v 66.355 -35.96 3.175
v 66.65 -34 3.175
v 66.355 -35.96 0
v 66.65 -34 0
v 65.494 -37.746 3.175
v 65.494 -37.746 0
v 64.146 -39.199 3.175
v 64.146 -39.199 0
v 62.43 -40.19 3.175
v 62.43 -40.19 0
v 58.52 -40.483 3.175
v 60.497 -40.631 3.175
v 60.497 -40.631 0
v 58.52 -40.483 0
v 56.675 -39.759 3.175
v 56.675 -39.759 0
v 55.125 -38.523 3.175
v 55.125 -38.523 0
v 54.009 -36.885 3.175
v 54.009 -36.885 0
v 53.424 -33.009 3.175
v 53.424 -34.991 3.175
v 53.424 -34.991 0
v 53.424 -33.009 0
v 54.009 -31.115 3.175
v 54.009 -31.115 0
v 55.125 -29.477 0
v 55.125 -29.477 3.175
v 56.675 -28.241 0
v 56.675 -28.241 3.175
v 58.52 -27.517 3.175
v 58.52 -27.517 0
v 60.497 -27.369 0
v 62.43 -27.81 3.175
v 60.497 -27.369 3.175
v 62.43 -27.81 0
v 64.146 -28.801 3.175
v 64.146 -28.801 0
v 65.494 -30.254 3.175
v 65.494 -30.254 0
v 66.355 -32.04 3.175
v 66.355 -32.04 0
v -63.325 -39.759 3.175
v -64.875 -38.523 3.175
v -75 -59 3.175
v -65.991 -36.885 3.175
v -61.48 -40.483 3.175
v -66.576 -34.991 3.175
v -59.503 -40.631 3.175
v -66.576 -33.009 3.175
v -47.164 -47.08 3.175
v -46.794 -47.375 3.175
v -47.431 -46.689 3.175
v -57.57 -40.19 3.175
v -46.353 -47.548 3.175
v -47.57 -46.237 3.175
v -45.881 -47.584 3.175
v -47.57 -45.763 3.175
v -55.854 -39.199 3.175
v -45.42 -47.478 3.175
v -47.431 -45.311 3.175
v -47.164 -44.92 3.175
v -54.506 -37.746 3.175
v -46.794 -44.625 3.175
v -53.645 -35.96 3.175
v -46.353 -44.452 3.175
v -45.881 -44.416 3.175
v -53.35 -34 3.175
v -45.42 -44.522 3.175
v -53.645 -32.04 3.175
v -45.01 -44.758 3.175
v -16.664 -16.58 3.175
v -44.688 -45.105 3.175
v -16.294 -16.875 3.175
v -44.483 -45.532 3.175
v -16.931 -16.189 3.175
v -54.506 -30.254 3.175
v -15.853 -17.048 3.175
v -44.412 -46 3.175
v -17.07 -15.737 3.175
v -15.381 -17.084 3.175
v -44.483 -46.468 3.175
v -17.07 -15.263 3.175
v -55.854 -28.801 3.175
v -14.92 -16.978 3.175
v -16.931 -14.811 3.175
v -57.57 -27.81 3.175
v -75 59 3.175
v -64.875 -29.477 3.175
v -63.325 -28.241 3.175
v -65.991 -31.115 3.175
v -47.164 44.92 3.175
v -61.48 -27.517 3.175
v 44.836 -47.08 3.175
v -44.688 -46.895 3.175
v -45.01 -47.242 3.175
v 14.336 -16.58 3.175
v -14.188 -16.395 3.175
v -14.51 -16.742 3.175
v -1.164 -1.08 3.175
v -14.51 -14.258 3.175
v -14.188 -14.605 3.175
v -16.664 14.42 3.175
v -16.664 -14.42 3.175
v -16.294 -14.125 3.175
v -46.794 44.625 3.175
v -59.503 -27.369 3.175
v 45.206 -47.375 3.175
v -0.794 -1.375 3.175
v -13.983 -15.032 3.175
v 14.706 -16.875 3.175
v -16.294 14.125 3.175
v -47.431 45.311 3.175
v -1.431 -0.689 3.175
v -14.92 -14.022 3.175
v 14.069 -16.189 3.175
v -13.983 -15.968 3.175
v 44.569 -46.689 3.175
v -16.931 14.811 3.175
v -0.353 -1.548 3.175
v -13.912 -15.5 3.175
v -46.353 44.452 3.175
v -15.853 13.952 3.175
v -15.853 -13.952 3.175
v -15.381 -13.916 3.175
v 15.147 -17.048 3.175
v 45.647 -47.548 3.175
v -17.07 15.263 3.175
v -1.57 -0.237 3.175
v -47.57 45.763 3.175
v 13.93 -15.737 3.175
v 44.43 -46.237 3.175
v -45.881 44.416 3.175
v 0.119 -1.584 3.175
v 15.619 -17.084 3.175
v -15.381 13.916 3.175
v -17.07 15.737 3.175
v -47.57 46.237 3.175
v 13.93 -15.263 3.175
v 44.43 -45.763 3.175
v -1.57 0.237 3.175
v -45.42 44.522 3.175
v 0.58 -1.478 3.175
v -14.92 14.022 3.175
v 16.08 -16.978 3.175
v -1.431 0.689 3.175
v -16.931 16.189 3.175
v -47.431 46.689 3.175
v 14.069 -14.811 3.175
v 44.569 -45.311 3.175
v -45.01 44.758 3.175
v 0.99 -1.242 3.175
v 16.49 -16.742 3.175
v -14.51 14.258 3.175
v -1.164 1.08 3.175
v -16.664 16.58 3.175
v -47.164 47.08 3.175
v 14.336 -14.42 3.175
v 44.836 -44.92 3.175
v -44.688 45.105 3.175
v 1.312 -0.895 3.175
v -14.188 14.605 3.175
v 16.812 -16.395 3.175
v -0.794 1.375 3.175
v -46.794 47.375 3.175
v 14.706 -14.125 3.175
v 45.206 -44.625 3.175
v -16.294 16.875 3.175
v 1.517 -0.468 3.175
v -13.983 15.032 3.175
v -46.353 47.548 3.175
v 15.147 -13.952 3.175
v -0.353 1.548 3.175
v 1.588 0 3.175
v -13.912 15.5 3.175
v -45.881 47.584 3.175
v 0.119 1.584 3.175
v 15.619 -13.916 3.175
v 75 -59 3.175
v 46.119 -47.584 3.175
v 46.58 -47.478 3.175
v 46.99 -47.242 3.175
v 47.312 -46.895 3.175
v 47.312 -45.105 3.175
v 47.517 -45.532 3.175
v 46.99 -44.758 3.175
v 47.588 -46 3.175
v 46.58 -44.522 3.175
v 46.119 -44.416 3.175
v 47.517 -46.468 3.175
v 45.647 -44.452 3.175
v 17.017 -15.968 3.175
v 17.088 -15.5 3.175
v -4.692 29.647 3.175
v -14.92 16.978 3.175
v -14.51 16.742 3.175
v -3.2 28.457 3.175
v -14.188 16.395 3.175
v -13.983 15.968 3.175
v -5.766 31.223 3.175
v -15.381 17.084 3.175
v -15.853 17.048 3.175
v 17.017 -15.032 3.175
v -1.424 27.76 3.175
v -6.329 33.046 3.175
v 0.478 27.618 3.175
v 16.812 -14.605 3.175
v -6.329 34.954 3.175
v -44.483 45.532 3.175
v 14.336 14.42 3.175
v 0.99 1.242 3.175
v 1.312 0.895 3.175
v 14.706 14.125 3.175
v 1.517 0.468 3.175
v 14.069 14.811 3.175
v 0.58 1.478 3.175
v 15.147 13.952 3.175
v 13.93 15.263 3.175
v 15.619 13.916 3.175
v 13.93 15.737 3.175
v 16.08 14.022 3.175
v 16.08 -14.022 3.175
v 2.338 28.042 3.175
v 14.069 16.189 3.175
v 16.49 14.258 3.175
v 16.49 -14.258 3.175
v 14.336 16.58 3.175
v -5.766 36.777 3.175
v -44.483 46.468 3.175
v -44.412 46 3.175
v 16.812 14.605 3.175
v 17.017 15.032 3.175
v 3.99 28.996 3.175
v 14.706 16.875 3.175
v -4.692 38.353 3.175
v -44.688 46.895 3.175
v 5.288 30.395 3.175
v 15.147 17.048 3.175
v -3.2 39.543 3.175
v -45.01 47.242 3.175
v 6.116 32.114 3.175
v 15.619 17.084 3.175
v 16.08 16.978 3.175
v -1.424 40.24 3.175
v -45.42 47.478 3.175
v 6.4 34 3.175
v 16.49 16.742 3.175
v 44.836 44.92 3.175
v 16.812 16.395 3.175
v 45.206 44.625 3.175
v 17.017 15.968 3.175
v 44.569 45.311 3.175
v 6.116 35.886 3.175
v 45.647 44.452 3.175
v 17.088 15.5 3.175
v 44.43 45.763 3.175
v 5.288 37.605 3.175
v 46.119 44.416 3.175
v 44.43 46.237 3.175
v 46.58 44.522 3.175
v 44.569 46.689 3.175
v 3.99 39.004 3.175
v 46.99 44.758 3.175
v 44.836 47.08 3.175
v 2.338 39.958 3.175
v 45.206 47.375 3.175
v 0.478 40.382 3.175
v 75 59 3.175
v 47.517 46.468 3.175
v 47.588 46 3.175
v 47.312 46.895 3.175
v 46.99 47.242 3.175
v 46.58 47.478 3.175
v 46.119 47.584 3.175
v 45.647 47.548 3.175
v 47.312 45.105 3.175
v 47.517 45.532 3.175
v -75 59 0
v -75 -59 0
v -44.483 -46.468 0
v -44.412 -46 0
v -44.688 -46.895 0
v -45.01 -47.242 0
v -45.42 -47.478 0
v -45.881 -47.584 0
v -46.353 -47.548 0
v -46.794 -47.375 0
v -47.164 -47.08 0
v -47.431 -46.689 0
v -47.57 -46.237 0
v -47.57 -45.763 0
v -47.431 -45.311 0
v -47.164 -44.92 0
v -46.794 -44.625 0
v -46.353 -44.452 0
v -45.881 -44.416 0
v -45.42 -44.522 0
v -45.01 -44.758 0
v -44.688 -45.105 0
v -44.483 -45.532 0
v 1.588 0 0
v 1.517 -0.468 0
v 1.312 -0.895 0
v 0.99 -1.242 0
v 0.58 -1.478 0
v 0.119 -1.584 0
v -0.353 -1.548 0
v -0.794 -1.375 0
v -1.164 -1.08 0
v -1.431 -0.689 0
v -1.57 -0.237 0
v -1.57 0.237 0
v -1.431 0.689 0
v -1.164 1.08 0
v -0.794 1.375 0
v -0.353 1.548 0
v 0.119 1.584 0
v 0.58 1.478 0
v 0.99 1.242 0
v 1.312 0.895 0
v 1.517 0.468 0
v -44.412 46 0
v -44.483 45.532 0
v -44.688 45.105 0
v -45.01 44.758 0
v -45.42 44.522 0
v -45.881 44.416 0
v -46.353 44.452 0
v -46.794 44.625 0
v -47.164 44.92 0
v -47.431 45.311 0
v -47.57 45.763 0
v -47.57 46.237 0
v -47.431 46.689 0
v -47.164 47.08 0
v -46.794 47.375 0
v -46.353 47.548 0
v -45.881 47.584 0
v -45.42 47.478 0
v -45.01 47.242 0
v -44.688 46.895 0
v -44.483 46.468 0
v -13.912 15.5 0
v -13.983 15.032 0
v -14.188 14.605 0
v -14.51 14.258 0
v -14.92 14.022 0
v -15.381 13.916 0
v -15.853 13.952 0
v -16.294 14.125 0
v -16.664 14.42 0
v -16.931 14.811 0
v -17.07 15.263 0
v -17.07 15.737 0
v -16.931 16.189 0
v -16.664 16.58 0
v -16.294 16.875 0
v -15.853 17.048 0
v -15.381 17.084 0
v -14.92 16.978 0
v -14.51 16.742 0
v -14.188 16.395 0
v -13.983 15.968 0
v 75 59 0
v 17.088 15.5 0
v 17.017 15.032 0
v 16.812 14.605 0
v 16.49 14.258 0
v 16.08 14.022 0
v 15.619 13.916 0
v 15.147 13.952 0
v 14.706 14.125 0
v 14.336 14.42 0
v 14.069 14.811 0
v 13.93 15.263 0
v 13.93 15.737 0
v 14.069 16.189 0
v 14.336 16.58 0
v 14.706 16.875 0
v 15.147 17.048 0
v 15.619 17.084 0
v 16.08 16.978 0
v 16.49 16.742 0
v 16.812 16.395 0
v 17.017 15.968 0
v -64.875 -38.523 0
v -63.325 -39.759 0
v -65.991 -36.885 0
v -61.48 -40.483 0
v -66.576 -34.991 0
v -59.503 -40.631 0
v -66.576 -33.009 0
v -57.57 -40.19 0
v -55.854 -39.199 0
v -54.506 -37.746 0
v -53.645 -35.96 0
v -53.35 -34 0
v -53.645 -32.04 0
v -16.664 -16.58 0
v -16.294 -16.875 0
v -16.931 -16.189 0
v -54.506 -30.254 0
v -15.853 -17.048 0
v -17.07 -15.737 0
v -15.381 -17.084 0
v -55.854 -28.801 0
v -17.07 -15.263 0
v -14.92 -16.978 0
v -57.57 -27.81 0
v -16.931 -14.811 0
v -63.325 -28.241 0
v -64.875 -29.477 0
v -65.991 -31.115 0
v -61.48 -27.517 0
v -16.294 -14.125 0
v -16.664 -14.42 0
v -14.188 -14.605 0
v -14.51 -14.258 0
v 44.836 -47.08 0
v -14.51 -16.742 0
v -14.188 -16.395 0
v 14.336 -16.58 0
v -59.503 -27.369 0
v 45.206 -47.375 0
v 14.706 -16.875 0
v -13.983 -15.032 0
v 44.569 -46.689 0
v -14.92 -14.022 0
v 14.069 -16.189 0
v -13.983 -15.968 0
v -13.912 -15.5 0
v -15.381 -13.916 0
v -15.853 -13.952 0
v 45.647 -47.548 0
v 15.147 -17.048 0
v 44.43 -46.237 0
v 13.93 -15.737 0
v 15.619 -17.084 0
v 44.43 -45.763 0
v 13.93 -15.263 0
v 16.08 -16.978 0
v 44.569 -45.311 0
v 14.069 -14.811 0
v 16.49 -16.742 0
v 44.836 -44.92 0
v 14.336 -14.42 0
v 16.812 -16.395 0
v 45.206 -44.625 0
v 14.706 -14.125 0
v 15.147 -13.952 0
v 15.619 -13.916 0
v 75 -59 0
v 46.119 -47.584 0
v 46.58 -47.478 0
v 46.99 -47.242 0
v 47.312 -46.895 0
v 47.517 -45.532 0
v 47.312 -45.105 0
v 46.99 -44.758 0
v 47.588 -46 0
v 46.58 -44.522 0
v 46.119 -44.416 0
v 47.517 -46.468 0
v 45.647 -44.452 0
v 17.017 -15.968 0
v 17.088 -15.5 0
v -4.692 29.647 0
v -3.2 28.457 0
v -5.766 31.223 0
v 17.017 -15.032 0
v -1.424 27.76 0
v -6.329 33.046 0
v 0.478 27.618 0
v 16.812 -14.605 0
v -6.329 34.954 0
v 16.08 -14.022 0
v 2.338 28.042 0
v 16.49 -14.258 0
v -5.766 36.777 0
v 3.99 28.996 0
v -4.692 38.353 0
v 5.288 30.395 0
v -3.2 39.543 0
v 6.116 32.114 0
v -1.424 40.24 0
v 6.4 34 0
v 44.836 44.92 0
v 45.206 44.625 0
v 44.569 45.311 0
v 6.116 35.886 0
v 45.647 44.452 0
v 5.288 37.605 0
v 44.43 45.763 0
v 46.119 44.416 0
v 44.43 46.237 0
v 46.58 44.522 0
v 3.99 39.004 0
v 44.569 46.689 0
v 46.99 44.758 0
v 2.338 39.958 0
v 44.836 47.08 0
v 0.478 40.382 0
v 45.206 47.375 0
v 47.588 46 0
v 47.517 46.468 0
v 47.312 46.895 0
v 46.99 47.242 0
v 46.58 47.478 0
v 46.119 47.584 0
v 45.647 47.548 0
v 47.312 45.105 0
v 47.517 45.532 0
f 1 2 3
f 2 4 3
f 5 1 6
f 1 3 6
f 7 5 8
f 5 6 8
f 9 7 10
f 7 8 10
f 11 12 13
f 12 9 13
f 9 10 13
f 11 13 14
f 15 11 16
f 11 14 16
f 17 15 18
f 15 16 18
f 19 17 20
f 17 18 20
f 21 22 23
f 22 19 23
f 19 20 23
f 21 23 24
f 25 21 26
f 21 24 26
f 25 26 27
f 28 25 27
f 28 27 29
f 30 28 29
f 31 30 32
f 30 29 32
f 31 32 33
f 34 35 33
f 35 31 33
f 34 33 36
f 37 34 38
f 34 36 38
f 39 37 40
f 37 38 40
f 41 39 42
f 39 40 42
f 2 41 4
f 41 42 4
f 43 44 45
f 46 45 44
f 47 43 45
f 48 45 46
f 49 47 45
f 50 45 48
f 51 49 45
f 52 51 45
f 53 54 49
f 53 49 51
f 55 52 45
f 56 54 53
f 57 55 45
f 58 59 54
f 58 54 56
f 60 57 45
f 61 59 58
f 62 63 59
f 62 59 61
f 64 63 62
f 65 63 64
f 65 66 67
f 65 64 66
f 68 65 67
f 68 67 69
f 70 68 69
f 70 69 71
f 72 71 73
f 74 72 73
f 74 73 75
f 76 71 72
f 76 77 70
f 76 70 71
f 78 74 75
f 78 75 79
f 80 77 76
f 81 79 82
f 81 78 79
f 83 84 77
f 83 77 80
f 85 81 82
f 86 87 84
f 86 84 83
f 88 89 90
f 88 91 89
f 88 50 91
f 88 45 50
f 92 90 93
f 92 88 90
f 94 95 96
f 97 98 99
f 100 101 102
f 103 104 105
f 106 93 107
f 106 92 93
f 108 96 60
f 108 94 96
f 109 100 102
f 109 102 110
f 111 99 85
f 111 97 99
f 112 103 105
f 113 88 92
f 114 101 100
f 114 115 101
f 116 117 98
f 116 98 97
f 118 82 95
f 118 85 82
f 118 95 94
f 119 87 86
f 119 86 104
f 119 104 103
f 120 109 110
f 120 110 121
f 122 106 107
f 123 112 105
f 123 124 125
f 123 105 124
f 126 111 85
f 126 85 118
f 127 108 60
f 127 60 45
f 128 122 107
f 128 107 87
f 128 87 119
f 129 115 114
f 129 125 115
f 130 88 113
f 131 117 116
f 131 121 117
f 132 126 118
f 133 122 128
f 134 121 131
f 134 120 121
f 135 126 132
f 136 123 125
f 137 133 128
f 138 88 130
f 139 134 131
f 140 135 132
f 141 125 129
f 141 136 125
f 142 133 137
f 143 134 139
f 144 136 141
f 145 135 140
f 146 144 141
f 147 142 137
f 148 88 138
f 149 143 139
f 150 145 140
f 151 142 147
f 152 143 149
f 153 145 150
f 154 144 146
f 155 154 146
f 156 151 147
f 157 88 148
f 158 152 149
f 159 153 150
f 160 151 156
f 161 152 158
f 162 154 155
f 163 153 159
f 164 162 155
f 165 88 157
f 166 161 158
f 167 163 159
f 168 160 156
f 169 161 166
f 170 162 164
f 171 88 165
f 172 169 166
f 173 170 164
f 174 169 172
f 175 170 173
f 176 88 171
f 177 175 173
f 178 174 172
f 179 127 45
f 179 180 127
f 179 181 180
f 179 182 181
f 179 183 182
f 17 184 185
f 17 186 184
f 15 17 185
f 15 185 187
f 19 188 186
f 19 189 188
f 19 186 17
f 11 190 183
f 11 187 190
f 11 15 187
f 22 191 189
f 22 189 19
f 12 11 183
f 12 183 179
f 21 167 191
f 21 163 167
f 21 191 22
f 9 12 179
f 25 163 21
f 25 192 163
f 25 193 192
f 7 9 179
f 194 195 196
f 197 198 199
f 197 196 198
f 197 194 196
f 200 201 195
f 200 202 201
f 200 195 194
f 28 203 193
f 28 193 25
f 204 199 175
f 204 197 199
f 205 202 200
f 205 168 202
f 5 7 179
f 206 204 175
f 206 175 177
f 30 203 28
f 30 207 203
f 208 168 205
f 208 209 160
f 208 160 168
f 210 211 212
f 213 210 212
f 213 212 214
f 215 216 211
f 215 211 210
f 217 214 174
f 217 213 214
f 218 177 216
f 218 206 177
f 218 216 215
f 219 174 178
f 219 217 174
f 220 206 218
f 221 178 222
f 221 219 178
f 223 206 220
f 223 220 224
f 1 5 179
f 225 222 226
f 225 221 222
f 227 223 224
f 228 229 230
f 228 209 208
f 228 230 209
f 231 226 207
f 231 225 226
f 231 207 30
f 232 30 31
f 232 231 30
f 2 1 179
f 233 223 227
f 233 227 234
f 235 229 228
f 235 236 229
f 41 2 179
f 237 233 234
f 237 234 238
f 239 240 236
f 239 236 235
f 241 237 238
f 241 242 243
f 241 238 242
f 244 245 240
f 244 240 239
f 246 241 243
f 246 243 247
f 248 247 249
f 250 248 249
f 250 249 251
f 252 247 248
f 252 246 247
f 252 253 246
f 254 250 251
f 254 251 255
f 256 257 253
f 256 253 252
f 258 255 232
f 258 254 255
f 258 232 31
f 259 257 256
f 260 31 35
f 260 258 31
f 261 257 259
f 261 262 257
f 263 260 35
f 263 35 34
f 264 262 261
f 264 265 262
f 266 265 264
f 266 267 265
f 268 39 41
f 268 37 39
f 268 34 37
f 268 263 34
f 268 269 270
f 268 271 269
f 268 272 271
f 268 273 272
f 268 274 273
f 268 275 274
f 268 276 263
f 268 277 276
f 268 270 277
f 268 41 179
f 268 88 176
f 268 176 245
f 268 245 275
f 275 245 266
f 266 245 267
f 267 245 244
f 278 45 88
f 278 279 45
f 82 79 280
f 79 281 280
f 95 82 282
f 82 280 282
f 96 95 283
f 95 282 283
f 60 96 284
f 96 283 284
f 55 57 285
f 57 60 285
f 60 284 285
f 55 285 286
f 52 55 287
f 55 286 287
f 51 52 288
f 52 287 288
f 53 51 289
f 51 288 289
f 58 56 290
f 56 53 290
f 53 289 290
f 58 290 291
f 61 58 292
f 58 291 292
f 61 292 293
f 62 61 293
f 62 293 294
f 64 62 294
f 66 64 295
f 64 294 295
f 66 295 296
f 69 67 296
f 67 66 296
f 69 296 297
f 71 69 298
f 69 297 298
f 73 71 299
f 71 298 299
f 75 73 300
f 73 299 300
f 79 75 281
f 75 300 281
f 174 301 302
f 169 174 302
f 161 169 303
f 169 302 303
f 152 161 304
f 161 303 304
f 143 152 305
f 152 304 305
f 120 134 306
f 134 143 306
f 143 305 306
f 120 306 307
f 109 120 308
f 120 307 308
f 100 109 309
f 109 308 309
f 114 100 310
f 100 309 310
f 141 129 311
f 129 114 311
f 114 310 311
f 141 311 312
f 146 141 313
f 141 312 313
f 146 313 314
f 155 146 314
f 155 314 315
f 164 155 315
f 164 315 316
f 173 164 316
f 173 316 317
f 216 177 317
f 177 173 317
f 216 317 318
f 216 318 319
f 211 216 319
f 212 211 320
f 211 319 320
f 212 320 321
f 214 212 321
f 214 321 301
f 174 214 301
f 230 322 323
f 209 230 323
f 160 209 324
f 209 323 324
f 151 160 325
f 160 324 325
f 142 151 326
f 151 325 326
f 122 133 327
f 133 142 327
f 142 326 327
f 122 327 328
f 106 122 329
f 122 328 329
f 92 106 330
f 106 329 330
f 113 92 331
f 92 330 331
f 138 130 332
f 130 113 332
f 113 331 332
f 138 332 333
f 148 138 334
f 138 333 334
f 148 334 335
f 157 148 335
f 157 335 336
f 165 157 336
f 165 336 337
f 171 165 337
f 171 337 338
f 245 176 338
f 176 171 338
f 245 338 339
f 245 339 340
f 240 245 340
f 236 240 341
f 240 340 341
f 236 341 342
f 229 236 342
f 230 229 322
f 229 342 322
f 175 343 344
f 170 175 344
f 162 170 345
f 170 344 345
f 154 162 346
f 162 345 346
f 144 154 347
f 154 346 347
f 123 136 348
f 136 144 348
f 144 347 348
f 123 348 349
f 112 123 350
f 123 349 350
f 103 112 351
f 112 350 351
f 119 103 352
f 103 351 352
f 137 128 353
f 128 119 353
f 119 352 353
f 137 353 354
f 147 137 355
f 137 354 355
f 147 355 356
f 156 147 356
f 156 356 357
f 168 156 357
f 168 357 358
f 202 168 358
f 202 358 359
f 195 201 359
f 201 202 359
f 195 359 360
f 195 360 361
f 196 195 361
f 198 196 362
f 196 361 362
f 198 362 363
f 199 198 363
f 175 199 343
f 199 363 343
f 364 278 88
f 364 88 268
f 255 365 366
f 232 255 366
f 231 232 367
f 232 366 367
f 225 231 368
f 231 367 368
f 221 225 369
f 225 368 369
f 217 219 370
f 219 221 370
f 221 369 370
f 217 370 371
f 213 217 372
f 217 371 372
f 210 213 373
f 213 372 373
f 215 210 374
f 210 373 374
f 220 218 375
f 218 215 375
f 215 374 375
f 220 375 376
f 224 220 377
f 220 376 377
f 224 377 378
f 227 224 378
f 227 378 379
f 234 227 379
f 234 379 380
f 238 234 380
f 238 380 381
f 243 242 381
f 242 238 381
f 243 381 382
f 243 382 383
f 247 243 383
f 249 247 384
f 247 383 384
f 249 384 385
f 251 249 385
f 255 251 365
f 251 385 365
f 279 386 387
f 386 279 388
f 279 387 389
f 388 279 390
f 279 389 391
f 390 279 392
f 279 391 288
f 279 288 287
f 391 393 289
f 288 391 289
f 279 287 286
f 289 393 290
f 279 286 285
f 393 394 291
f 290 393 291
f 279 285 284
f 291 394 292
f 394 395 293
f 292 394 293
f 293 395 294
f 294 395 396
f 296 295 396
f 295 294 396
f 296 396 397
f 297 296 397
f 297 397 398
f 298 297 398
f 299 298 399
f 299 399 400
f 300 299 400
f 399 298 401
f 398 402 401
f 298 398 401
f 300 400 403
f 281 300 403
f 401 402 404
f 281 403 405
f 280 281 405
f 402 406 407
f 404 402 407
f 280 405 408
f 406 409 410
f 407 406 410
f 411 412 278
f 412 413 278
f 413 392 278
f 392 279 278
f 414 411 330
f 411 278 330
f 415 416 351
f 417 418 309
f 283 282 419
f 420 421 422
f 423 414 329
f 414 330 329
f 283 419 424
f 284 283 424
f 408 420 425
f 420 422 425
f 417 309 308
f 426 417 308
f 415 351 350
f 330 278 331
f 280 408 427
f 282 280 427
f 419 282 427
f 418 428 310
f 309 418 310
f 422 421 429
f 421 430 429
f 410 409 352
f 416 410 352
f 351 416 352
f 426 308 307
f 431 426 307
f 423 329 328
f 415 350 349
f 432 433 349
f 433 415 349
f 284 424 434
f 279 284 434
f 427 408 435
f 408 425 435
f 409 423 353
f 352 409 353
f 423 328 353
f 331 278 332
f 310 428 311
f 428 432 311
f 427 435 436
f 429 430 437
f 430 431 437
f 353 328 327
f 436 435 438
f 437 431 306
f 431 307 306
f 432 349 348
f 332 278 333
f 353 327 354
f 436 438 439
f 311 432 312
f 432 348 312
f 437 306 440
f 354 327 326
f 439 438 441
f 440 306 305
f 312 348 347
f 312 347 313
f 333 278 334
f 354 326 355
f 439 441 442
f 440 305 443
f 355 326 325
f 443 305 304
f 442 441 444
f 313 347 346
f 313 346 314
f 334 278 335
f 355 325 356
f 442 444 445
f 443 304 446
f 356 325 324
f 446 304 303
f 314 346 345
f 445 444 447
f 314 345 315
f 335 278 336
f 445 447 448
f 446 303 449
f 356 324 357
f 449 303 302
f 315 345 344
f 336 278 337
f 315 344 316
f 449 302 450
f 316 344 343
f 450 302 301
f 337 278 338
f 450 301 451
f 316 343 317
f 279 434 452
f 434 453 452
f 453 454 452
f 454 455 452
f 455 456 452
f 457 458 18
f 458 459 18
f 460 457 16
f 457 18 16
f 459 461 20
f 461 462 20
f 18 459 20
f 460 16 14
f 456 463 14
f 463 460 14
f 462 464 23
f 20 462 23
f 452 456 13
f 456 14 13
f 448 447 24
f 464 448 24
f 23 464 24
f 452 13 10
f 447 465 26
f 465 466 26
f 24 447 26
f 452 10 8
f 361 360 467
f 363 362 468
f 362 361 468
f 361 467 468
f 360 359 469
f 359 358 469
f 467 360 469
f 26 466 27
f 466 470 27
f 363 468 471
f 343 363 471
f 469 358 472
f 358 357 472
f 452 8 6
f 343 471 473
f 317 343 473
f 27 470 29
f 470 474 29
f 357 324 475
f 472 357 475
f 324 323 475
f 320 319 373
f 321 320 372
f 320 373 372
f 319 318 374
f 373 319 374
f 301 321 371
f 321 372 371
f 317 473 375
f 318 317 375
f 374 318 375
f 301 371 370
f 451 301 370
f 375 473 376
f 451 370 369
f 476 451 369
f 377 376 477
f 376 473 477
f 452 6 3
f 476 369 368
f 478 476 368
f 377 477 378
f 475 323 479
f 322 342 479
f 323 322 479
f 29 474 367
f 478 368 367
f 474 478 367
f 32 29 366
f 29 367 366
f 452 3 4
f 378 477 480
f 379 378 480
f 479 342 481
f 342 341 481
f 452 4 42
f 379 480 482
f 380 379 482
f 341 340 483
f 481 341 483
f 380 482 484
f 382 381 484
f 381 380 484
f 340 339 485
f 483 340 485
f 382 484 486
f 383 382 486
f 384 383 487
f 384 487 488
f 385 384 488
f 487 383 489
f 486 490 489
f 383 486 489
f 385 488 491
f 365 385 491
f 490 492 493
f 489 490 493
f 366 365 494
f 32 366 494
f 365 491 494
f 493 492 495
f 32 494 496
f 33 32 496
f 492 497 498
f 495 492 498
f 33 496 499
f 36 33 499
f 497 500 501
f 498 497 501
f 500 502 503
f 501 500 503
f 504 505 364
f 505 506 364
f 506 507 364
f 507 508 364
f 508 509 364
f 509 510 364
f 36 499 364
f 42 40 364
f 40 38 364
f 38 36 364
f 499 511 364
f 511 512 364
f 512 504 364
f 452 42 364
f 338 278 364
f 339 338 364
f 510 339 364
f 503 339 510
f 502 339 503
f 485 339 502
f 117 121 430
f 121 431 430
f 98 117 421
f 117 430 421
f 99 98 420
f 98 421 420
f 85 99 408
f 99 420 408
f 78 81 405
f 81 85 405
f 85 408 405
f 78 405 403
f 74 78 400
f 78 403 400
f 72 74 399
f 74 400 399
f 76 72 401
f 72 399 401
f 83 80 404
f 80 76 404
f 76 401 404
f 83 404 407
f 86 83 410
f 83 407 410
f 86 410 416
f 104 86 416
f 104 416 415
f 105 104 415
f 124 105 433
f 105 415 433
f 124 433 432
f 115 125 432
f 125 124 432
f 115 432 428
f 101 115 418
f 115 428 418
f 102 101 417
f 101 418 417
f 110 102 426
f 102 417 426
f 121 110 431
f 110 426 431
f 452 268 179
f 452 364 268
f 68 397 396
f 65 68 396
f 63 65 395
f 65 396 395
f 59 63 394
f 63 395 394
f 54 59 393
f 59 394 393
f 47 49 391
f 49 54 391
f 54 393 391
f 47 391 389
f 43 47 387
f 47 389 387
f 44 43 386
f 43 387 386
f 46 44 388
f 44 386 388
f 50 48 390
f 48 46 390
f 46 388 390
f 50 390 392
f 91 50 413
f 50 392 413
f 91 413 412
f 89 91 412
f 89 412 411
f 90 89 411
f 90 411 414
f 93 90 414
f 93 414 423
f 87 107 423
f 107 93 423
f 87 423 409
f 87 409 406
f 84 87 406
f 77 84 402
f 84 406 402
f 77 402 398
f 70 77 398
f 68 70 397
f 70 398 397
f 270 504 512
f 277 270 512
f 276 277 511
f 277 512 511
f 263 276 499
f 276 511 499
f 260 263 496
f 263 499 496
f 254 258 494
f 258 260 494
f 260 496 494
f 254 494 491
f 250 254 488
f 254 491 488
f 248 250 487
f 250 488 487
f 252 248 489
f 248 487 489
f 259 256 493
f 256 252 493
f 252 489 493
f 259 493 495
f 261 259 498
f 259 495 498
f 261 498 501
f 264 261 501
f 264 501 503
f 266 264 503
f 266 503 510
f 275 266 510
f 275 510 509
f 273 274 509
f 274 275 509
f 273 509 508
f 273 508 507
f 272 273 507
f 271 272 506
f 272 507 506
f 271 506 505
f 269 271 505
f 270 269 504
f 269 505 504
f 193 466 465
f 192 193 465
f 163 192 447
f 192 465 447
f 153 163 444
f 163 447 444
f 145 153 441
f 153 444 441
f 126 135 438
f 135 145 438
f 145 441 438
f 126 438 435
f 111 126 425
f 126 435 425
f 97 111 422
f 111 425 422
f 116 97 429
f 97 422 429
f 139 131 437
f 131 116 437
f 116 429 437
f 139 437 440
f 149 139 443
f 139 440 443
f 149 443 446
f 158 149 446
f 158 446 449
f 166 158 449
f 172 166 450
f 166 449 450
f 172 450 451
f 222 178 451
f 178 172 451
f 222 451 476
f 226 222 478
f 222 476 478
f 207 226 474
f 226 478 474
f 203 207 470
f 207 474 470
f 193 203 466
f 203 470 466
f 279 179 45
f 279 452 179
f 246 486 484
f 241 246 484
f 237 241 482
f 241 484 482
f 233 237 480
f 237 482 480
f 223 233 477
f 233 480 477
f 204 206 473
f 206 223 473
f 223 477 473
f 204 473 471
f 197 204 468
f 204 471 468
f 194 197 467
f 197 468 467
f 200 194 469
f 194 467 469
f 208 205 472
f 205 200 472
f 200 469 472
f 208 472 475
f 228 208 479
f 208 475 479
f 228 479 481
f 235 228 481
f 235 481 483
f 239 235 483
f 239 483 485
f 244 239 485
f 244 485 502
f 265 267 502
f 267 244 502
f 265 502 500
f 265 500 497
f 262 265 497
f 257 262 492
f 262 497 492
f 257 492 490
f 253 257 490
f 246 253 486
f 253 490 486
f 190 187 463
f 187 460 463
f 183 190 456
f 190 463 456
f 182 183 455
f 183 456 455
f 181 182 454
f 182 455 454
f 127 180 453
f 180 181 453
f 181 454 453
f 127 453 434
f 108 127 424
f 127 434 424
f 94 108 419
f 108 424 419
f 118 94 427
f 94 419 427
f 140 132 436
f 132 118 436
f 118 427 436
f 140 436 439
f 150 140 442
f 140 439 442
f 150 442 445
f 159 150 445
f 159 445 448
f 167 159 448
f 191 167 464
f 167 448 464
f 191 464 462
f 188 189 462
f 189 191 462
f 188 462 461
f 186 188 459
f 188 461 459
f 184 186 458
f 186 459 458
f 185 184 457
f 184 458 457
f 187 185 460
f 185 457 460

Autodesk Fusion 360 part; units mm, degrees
sketch "movingPlatform" plane through (0, 0, 0) normal (0, 0, 1) x (1, 0, 0)
  line L0 (-75, 59) -> (75, 59)
  line L1 (75, 59) -> (75, -59)
  line L2 (75, -59) -> (-75, -59)
  line L3 (-75, -59) -> (-75, 59)
  line L4 (-75, 59) -> (75, -59) construction
  line L5 (75, 59) -> (-75, -59) construction
  circle A0 centre (-60, -34) radius 6.65
  line L6 (0, 2.5) -> (0, 20)
  circle A1 centre (60, -34) radius 6.65
  circle A2 centre (0, 34) radius 6.4
  circle A3 centre (-46, -46) radius 1.588
  circle A4 centre (-15.5, -15.5) radius 1.588
  circle A5 centre (0, 0) radius 57 construction
  circle A6 centre (15.5, -15.5) radius 1.588
  circle A7 centre (15.5, 15.5) radius 1.588
  circle A8 centre (46, -46) radius 1.588
  circle A9 centre (-46, 46) radius 1.588
  circle A10 centre (46, 46) radius 1.588
  circle A11 centre (-15.5, 15.5) radius 1.588
  circle A12 centre (0, 0) radius 1.588
  dimension "d1" = 150
  dimension "d2" = 118
  dimension "d3" = 13.3
  dimension "d4" = 120
  dimension "d5" = 12.8
  dimension "d6" = 68
  dimension "d7" = 25
  dimension "d8" = 25
  dimension "d9" = 3.176
  dimension "d12" = 92
  dimension "d13" = 92
  dimension "d21" = 3.176
  dimension "d24" = 31
  dimension "d25" = 31
  dimension "d27" = 15.5
  dimension "d31" = 114
  dimension "d34" = 46
  dimension "d37" = 46
  dimension "d49" = 15.5
  dimension "d52" = 3.176
extrude "Extrude3" add sketch "movingPlatform" along normal blind 3.175
equation "d4 = 132.800 mm - 12.8 mm"
